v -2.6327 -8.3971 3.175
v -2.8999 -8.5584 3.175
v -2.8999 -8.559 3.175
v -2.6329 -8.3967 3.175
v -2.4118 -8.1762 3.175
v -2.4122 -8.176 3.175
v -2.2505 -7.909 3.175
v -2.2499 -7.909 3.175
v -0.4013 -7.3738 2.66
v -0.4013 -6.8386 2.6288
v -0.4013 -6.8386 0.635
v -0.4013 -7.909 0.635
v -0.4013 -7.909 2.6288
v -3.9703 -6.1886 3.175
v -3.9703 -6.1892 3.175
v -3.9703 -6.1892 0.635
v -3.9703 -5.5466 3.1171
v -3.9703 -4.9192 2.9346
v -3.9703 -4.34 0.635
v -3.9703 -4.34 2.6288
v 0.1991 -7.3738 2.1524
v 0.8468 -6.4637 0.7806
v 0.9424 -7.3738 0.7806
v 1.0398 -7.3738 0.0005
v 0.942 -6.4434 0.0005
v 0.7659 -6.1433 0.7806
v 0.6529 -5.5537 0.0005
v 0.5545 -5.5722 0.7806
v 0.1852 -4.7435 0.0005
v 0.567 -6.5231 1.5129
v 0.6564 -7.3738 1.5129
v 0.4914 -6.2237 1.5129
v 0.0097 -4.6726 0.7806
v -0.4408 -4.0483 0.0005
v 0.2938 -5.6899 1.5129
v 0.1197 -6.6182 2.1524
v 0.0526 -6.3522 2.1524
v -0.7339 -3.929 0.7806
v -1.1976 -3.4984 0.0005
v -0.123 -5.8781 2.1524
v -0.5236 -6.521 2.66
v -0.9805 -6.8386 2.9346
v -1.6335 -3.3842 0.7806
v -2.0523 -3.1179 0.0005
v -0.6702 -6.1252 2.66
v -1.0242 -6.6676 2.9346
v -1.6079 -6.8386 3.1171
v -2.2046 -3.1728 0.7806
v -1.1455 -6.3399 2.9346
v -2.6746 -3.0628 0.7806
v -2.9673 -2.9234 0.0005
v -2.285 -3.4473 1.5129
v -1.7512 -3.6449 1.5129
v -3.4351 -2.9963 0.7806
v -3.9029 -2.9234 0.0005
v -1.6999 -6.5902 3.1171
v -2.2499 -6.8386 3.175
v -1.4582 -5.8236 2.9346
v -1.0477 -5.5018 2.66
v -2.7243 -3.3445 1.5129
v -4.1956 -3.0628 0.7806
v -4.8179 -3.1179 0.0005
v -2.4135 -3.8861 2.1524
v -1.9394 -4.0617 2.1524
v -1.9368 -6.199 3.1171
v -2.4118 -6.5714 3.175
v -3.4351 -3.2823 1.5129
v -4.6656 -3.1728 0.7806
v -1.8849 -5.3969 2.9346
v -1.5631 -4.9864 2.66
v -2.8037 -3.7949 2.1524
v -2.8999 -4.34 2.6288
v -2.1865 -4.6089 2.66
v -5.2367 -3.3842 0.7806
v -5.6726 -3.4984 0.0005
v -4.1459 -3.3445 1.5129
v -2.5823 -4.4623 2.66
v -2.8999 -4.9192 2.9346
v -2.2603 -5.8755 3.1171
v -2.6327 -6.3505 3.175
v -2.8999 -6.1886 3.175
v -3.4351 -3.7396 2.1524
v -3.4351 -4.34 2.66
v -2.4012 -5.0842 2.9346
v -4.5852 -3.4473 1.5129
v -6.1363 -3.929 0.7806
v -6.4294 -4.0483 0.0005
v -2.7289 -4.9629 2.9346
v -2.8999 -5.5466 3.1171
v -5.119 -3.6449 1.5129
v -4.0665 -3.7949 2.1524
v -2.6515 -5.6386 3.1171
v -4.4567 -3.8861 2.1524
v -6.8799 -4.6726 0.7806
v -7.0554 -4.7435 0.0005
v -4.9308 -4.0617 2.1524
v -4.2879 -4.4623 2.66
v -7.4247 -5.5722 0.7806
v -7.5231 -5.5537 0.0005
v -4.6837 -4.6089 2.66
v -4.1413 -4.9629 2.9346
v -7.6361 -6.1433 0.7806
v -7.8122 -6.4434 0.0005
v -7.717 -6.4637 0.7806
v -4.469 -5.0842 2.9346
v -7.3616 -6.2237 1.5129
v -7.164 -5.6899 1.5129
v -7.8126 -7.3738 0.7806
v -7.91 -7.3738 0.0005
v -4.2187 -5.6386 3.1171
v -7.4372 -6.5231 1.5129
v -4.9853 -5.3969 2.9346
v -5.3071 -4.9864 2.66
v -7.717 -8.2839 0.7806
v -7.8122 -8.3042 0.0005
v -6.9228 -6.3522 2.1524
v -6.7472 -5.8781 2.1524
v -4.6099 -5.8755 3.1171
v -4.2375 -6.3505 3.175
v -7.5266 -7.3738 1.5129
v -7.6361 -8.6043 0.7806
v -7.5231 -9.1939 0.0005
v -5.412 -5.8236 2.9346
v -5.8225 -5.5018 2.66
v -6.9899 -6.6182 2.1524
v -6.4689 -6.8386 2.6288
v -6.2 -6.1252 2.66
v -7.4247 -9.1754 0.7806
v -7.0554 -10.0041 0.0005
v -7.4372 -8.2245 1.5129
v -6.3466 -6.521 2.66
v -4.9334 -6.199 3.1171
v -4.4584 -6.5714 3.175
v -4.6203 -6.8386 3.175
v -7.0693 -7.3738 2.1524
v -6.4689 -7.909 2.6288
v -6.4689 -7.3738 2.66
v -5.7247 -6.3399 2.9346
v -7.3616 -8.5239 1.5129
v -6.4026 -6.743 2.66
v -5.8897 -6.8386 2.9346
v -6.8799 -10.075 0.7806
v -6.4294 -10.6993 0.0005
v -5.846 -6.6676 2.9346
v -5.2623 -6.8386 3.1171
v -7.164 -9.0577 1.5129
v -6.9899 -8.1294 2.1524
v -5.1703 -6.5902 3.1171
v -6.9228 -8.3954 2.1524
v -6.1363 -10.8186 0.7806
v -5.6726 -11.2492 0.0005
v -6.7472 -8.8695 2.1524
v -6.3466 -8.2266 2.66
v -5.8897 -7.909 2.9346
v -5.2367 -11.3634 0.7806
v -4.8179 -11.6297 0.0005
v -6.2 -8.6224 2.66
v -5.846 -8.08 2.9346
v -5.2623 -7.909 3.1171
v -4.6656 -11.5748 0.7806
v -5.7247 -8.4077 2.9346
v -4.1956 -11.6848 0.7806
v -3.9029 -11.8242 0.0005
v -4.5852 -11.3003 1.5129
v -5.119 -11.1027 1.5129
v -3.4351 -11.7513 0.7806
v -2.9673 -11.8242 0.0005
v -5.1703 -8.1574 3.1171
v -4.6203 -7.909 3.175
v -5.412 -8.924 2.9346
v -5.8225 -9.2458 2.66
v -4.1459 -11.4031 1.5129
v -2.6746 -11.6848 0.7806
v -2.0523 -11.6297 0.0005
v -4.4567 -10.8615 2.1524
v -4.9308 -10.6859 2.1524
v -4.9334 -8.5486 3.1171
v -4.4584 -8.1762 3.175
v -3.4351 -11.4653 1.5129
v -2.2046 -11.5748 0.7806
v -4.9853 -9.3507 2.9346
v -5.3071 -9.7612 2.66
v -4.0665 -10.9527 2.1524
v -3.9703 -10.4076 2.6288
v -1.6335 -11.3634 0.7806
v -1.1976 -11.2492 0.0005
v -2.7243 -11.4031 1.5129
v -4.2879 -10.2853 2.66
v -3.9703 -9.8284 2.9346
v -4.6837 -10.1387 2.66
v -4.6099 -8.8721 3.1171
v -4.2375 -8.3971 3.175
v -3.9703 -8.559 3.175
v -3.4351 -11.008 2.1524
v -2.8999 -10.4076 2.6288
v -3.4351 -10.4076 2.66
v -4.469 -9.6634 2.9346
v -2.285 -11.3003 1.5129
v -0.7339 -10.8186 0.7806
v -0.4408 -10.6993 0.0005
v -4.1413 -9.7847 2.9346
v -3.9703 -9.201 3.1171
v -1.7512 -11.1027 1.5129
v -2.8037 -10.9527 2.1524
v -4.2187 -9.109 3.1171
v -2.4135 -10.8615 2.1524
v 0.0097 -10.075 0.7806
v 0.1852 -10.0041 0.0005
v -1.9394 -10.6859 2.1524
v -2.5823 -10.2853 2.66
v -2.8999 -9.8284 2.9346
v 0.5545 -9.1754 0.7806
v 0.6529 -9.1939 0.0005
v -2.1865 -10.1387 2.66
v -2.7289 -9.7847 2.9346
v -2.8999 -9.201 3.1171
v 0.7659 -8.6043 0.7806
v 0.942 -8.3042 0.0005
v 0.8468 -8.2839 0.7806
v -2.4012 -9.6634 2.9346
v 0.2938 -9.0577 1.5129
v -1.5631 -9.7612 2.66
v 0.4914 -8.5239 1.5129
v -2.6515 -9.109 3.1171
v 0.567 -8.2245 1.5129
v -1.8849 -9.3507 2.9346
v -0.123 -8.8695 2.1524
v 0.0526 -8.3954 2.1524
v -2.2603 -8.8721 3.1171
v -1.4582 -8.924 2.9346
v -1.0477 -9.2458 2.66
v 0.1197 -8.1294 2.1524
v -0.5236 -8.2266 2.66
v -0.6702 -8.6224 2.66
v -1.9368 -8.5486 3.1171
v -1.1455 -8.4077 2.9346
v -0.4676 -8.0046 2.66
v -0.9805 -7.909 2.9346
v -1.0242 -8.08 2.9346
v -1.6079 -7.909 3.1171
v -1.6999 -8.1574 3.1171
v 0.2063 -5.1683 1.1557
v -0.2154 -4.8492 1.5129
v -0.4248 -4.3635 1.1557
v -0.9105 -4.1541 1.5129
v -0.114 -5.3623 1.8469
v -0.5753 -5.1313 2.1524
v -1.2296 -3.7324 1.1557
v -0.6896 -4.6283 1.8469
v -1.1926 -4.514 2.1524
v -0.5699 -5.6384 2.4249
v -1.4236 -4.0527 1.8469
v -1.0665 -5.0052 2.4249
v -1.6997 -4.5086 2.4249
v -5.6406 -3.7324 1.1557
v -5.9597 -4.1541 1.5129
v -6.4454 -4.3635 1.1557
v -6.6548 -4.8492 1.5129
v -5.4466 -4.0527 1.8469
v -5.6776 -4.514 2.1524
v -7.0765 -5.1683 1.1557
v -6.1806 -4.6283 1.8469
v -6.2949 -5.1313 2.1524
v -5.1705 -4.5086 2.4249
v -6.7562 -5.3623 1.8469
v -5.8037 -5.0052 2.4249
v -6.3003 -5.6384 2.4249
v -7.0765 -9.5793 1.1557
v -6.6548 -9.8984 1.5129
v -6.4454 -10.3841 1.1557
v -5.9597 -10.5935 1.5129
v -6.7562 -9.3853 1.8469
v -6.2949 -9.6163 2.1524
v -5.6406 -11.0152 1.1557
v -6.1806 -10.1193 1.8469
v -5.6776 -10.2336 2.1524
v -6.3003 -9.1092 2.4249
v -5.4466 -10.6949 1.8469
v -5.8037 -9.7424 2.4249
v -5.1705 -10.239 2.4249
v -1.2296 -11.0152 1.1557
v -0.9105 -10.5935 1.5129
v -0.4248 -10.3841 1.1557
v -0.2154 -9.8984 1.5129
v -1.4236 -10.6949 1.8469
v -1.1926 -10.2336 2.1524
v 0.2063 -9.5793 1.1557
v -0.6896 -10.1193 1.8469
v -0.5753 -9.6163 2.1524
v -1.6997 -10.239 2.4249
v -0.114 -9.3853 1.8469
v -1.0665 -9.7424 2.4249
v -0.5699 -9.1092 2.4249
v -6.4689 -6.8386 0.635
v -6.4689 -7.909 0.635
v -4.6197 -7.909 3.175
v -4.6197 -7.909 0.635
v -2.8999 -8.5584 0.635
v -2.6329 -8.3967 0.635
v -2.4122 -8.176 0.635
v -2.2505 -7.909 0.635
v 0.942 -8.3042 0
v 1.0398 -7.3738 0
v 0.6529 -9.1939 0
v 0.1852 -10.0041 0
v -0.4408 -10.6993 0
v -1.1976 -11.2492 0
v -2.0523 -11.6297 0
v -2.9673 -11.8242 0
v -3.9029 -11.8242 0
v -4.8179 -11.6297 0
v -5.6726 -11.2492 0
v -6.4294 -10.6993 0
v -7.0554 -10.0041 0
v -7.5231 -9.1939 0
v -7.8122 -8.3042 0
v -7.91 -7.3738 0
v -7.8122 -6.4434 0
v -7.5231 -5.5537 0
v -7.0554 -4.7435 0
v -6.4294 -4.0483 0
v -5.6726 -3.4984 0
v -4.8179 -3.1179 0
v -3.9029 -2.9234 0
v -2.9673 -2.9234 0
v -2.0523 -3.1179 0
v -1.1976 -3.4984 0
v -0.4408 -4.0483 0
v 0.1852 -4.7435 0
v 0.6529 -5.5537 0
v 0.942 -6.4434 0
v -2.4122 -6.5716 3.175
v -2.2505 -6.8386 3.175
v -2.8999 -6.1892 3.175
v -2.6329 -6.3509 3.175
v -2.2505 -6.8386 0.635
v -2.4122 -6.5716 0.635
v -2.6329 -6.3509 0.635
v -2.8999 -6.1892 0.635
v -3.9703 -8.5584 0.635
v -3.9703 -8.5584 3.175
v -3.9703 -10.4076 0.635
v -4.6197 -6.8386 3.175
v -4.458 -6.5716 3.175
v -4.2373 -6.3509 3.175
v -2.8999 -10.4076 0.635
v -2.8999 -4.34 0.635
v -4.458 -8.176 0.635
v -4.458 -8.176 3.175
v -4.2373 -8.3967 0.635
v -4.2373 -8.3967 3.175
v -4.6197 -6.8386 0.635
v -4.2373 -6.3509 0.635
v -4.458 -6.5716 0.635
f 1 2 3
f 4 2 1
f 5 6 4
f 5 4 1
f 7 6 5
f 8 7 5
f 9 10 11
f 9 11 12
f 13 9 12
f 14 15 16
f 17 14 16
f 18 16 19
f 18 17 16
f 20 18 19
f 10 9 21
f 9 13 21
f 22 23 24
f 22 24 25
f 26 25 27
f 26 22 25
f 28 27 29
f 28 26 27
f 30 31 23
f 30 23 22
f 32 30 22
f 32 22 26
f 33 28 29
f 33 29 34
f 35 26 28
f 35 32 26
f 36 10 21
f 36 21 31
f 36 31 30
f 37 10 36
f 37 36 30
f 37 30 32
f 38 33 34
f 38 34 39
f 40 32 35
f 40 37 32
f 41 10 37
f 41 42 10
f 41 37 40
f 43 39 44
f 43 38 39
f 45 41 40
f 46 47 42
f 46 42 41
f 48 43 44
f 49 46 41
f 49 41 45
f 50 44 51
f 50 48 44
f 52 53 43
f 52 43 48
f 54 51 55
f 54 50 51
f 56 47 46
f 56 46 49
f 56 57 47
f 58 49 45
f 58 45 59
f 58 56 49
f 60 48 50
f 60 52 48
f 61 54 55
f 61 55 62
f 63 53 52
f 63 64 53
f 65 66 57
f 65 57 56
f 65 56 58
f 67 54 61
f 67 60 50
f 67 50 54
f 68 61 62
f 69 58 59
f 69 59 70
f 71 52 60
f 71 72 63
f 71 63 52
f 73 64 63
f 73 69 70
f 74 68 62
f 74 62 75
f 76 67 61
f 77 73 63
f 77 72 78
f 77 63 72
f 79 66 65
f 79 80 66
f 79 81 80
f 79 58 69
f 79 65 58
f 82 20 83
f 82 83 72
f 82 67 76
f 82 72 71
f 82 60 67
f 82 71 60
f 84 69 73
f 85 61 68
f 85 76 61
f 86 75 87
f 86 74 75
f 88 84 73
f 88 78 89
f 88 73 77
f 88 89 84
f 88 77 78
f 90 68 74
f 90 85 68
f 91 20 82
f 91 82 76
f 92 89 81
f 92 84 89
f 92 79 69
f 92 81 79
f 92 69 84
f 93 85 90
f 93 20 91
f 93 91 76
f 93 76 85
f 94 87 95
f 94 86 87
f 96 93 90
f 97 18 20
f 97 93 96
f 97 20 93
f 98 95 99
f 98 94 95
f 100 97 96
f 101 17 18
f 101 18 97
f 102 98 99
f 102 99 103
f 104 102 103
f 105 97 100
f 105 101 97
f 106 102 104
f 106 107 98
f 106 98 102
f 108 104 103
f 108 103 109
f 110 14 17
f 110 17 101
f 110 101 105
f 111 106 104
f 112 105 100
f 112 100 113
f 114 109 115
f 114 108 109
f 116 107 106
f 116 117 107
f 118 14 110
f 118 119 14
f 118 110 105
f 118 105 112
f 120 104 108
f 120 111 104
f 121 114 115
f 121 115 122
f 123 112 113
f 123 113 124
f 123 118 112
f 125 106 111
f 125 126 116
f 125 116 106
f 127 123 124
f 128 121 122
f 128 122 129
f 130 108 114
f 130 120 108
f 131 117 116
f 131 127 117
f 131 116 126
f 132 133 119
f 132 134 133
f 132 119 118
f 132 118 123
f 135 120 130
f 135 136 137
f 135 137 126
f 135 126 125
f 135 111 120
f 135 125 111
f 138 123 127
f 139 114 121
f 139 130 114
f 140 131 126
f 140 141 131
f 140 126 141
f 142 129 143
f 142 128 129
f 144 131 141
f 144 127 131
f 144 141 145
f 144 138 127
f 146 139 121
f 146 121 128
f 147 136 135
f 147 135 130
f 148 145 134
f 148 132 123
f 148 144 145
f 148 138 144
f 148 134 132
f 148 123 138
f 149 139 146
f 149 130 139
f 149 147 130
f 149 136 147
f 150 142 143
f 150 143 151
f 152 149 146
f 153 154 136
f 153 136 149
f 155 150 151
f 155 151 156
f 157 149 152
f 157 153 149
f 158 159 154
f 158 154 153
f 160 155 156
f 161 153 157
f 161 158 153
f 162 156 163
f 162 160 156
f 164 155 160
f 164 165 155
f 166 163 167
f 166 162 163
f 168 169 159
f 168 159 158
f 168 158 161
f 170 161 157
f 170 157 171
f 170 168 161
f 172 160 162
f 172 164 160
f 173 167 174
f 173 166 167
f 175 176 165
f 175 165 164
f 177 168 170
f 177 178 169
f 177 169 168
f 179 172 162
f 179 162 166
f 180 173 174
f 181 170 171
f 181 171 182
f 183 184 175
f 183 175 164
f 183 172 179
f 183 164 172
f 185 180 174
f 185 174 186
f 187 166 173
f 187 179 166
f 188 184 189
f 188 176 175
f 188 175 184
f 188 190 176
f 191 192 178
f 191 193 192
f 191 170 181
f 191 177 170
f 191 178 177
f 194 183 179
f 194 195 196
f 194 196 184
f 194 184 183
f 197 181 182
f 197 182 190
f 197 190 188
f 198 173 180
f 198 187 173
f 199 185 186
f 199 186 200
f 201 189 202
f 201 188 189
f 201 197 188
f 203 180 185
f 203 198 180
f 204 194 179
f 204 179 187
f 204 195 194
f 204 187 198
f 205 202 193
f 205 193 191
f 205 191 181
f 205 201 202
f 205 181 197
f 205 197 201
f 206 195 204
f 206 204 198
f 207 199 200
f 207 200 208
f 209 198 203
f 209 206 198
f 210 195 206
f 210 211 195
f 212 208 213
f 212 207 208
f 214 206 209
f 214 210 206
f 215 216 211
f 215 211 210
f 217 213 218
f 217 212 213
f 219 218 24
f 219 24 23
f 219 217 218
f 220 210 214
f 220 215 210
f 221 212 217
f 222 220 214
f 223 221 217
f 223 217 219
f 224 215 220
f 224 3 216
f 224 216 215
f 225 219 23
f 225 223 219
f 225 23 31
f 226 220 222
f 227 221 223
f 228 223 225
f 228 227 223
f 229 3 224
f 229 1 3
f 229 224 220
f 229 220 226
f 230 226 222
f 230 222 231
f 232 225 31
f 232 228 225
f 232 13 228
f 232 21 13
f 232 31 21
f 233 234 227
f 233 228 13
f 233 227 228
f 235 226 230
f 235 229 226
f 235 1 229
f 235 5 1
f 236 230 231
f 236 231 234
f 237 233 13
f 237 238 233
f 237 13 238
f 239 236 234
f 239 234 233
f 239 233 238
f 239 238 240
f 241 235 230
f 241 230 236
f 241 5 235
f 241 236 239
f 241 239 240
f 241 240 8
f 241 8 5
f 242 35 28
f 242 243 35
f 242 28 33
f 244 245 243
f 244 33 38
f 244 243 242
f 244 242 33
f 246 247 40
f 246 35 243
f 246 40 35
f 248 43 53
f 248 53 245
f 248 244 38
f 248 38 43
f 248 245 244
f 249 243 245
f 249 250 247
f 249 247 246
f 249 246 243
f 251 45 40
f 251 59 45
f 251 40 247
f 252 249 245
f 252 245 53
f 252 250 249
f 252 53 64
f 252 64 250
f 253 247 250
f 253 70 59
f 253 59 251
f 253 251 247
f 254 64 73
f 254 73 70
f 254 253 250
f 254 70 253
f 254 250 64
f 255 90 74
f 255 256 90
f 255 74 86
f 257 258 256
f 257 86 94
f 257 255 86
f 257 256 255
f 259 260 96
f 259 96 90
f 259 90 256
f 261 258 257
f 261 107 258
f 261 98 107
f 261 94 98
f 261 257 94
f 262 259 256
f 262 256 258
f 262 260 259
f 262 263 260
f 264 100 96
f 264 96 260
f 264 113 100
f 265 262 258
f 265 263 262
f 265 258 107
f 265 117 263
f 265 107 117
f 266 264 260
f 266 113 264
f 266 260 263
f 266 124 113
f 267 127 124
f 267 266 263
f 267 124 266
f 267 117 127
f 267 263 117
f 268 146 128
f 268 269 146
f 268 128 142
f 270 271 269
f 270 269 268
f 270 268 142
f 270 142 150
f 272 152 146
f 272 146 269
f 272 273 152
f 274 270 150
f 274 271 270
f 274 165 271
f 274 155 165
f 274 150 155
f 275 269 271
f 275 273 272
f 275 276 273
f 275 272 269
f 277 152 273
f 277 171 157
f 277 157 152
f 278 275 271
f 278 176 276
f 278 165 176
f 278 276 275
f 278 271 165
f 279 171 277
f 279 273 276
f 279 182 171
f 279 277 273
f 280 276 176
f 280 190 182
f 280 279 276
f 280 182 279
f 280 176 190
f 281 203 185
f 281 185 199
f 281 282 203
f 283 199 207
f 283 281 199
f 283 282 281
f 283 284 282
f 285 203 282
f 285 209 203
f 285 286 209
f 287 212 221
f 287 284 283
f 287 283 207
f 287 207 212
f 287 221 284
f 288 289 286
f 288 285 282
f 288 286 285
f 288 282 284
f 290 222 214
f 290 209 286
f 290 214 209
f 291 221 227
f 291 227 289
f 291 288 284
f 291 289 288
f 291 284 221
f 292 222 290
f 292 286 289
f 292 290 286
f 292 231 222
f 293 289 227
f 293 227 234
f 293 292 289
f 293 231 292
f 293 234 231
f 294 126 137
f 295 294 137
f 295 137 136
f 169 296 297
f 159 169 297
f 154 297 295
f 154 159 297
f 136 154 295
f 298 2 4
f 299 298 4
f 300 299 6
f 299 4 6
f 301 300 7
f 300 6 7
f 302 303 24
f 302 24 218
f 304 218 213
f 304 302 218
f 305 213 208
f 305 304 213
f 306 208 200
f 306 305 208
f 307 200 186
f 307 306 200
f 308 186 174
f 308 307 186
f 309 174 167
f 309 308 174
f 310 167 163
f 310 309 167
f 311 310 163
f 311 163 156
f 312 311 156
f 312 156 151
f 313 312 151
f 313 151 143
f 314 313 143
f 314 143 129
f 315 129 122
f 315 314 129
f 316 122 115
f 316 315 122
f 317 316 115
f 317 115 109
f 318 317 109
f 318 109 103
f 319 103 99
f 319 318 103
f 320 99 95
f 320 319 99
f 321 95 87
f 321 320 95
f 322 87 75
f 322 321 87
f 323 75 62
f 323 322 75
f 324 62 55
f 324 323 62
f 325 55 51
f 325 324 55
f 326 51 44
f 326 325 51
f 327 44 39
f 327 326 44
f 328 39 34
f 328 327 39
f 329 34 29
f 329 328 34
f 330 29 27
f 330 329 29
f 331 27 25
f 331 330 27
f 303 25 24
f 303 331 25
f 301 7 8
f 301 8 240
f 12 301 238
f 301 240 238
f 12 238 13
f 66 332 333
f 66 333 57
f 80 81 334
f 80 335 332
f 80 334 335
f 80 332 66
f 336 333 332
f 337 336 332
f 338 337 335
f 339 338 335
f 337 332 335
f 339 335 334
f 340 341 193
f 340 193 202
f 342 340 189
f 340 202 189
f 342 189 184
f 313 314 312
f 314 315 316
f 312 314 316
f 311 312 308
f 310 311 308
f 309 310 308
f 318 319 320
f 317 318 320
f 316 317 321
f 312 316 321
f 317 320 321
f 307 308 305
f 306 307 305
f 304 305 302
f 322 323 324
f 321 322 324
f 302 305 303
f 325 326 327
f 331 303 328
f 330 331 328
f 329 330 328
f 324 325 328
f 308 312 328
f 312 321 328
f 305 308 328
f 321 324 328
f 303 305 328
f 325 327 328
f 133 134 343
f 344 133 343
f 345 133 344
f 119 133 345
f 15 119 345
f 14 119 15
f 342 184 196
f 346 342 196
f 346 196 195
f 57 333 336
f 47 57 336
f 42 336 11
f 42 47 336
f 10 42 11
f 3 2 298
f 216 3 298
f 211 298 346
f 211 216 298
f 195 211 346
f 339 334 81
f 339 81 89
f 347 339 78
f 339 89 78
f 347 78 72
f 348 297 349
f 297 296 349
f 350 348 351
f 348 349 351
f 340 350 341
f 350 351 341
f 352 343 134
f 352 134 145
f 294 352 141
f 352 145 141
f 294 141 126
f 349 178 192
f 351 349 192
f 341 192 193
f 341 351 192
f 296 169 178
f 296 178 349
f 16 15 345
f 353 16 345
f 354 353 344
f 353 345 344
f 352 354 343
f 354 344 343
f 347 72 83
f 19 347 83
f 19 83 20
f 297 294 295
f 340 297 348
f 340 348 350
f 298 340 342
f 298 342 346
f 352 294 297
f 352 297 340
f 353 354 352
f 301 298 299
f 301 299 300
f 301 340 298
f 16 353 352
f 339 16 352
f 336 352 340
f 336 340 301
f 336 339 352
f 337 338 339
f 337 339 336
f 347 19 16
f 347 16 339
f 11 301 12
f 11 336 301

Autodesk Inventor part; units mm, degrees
ref_plane "YZ Plane" through (0, 0, 0) normal (1, 0, 0) x (0, 1, 0)
ref_plane "XZ Plane" through (0, 0, 0) normal (0, 1, 0) x (-1, 0, 0)
ref_plane "XY Plane" through (0, 0, 0) normal (0, 0, 1) x (1, 0, 0)
sketch "Sketch1" plane through (0, 0, 0) normal (0, 0, 1) x (1, 0, 0)
  circle A0 centre (-3.4351, -7.3738) radius 1.5 projected
  circle A1 centre (-3.4351, -7.3738) radius 4.4749
  point P0 (0, 0)
extrude "Extrusion1" add sketch "Sketch1" along normal blind 3.175 contours A0 | A1
fillet "Fillet1" radius 3.175 1 edges at (-7.91, -7.3738, 3.175)
sketch "Sketch2" plane through (-3.4351, -7.3738, 3.175) normal (0, 0, 1) x (1, 0, 0)
  circle A0 centre (0, 0) radius 1.2999 construction
  line L0 (-6.0004, 0) -> (5.9052, 0) construction
  line L1 (0.0173, 5.7893) -> (0.0173, -4.6347) construction
  line L2 (1.1846, 0.5352) -> (3.0338, 0.5352)
  line L3 (3.0338, 0.5352) -> (3.0338, 0)
  line L4 (1.1846, -0.5352) -> (3.0338, -0.5352)
  line L5 (3.0338, -0.5352) -> (3.0338, 0)
  line L6 (-0.5352, 1.1846) -> (-0.5352, 3.0338)
  line L7 (-0.5352, 3.0338) -> (0, 3.0338)
  line L8 (0.5352, 1.1846) -> (0.5352, 3.0338)
  line L9 (0.5352, 3.0338) -> (0, 3.0338)
  line L10 (-1.1846, -0.5352) -> (-3.0338, -0.5352)
  line L11 (-3.0338, -0.5352) -> (-3.0338, 0)
  line L12 (-1.1846, 0.5352) -> (-3.0338, 0.5352)
  line L13 (-3.0338, 0.5352) -> (-3.0338, 0)
  line L14 (0.5352, -1.1846) -> (0.5352, -3.0338)
  line L15 (0.5352, -3.0338) -> (0, -3.0338)
  line L16 (-0.5352, -1.1846) -> (-0.5352, -3.0338)
  line L17 (-0.5352, -3.0338) -> (0, -3.0338)
  arc A1 (1.1846, 0.5352) -> (0.5352, 1.1846) centre (0, 0) ccw
  arc A2 (-0.5352, 1.1846) -> (-1.1846, 0.5352) centre (0, 0) ccw
  arc A3 (-1.1846, -0.5352) -> (-0.5352, -1.1846) centre (0, 0) ccw
  arc A4 (0.5352, -1.1846) -> (1.1846, -0.5352) centre (0, 0) ccw
  point P0 (3.4351, 7.3738)
  dimension "d5" = 360
extrude "Extrusion2" cut sketch "Sketch2" against normal blind 2.54
properties part number "Bolt1"
